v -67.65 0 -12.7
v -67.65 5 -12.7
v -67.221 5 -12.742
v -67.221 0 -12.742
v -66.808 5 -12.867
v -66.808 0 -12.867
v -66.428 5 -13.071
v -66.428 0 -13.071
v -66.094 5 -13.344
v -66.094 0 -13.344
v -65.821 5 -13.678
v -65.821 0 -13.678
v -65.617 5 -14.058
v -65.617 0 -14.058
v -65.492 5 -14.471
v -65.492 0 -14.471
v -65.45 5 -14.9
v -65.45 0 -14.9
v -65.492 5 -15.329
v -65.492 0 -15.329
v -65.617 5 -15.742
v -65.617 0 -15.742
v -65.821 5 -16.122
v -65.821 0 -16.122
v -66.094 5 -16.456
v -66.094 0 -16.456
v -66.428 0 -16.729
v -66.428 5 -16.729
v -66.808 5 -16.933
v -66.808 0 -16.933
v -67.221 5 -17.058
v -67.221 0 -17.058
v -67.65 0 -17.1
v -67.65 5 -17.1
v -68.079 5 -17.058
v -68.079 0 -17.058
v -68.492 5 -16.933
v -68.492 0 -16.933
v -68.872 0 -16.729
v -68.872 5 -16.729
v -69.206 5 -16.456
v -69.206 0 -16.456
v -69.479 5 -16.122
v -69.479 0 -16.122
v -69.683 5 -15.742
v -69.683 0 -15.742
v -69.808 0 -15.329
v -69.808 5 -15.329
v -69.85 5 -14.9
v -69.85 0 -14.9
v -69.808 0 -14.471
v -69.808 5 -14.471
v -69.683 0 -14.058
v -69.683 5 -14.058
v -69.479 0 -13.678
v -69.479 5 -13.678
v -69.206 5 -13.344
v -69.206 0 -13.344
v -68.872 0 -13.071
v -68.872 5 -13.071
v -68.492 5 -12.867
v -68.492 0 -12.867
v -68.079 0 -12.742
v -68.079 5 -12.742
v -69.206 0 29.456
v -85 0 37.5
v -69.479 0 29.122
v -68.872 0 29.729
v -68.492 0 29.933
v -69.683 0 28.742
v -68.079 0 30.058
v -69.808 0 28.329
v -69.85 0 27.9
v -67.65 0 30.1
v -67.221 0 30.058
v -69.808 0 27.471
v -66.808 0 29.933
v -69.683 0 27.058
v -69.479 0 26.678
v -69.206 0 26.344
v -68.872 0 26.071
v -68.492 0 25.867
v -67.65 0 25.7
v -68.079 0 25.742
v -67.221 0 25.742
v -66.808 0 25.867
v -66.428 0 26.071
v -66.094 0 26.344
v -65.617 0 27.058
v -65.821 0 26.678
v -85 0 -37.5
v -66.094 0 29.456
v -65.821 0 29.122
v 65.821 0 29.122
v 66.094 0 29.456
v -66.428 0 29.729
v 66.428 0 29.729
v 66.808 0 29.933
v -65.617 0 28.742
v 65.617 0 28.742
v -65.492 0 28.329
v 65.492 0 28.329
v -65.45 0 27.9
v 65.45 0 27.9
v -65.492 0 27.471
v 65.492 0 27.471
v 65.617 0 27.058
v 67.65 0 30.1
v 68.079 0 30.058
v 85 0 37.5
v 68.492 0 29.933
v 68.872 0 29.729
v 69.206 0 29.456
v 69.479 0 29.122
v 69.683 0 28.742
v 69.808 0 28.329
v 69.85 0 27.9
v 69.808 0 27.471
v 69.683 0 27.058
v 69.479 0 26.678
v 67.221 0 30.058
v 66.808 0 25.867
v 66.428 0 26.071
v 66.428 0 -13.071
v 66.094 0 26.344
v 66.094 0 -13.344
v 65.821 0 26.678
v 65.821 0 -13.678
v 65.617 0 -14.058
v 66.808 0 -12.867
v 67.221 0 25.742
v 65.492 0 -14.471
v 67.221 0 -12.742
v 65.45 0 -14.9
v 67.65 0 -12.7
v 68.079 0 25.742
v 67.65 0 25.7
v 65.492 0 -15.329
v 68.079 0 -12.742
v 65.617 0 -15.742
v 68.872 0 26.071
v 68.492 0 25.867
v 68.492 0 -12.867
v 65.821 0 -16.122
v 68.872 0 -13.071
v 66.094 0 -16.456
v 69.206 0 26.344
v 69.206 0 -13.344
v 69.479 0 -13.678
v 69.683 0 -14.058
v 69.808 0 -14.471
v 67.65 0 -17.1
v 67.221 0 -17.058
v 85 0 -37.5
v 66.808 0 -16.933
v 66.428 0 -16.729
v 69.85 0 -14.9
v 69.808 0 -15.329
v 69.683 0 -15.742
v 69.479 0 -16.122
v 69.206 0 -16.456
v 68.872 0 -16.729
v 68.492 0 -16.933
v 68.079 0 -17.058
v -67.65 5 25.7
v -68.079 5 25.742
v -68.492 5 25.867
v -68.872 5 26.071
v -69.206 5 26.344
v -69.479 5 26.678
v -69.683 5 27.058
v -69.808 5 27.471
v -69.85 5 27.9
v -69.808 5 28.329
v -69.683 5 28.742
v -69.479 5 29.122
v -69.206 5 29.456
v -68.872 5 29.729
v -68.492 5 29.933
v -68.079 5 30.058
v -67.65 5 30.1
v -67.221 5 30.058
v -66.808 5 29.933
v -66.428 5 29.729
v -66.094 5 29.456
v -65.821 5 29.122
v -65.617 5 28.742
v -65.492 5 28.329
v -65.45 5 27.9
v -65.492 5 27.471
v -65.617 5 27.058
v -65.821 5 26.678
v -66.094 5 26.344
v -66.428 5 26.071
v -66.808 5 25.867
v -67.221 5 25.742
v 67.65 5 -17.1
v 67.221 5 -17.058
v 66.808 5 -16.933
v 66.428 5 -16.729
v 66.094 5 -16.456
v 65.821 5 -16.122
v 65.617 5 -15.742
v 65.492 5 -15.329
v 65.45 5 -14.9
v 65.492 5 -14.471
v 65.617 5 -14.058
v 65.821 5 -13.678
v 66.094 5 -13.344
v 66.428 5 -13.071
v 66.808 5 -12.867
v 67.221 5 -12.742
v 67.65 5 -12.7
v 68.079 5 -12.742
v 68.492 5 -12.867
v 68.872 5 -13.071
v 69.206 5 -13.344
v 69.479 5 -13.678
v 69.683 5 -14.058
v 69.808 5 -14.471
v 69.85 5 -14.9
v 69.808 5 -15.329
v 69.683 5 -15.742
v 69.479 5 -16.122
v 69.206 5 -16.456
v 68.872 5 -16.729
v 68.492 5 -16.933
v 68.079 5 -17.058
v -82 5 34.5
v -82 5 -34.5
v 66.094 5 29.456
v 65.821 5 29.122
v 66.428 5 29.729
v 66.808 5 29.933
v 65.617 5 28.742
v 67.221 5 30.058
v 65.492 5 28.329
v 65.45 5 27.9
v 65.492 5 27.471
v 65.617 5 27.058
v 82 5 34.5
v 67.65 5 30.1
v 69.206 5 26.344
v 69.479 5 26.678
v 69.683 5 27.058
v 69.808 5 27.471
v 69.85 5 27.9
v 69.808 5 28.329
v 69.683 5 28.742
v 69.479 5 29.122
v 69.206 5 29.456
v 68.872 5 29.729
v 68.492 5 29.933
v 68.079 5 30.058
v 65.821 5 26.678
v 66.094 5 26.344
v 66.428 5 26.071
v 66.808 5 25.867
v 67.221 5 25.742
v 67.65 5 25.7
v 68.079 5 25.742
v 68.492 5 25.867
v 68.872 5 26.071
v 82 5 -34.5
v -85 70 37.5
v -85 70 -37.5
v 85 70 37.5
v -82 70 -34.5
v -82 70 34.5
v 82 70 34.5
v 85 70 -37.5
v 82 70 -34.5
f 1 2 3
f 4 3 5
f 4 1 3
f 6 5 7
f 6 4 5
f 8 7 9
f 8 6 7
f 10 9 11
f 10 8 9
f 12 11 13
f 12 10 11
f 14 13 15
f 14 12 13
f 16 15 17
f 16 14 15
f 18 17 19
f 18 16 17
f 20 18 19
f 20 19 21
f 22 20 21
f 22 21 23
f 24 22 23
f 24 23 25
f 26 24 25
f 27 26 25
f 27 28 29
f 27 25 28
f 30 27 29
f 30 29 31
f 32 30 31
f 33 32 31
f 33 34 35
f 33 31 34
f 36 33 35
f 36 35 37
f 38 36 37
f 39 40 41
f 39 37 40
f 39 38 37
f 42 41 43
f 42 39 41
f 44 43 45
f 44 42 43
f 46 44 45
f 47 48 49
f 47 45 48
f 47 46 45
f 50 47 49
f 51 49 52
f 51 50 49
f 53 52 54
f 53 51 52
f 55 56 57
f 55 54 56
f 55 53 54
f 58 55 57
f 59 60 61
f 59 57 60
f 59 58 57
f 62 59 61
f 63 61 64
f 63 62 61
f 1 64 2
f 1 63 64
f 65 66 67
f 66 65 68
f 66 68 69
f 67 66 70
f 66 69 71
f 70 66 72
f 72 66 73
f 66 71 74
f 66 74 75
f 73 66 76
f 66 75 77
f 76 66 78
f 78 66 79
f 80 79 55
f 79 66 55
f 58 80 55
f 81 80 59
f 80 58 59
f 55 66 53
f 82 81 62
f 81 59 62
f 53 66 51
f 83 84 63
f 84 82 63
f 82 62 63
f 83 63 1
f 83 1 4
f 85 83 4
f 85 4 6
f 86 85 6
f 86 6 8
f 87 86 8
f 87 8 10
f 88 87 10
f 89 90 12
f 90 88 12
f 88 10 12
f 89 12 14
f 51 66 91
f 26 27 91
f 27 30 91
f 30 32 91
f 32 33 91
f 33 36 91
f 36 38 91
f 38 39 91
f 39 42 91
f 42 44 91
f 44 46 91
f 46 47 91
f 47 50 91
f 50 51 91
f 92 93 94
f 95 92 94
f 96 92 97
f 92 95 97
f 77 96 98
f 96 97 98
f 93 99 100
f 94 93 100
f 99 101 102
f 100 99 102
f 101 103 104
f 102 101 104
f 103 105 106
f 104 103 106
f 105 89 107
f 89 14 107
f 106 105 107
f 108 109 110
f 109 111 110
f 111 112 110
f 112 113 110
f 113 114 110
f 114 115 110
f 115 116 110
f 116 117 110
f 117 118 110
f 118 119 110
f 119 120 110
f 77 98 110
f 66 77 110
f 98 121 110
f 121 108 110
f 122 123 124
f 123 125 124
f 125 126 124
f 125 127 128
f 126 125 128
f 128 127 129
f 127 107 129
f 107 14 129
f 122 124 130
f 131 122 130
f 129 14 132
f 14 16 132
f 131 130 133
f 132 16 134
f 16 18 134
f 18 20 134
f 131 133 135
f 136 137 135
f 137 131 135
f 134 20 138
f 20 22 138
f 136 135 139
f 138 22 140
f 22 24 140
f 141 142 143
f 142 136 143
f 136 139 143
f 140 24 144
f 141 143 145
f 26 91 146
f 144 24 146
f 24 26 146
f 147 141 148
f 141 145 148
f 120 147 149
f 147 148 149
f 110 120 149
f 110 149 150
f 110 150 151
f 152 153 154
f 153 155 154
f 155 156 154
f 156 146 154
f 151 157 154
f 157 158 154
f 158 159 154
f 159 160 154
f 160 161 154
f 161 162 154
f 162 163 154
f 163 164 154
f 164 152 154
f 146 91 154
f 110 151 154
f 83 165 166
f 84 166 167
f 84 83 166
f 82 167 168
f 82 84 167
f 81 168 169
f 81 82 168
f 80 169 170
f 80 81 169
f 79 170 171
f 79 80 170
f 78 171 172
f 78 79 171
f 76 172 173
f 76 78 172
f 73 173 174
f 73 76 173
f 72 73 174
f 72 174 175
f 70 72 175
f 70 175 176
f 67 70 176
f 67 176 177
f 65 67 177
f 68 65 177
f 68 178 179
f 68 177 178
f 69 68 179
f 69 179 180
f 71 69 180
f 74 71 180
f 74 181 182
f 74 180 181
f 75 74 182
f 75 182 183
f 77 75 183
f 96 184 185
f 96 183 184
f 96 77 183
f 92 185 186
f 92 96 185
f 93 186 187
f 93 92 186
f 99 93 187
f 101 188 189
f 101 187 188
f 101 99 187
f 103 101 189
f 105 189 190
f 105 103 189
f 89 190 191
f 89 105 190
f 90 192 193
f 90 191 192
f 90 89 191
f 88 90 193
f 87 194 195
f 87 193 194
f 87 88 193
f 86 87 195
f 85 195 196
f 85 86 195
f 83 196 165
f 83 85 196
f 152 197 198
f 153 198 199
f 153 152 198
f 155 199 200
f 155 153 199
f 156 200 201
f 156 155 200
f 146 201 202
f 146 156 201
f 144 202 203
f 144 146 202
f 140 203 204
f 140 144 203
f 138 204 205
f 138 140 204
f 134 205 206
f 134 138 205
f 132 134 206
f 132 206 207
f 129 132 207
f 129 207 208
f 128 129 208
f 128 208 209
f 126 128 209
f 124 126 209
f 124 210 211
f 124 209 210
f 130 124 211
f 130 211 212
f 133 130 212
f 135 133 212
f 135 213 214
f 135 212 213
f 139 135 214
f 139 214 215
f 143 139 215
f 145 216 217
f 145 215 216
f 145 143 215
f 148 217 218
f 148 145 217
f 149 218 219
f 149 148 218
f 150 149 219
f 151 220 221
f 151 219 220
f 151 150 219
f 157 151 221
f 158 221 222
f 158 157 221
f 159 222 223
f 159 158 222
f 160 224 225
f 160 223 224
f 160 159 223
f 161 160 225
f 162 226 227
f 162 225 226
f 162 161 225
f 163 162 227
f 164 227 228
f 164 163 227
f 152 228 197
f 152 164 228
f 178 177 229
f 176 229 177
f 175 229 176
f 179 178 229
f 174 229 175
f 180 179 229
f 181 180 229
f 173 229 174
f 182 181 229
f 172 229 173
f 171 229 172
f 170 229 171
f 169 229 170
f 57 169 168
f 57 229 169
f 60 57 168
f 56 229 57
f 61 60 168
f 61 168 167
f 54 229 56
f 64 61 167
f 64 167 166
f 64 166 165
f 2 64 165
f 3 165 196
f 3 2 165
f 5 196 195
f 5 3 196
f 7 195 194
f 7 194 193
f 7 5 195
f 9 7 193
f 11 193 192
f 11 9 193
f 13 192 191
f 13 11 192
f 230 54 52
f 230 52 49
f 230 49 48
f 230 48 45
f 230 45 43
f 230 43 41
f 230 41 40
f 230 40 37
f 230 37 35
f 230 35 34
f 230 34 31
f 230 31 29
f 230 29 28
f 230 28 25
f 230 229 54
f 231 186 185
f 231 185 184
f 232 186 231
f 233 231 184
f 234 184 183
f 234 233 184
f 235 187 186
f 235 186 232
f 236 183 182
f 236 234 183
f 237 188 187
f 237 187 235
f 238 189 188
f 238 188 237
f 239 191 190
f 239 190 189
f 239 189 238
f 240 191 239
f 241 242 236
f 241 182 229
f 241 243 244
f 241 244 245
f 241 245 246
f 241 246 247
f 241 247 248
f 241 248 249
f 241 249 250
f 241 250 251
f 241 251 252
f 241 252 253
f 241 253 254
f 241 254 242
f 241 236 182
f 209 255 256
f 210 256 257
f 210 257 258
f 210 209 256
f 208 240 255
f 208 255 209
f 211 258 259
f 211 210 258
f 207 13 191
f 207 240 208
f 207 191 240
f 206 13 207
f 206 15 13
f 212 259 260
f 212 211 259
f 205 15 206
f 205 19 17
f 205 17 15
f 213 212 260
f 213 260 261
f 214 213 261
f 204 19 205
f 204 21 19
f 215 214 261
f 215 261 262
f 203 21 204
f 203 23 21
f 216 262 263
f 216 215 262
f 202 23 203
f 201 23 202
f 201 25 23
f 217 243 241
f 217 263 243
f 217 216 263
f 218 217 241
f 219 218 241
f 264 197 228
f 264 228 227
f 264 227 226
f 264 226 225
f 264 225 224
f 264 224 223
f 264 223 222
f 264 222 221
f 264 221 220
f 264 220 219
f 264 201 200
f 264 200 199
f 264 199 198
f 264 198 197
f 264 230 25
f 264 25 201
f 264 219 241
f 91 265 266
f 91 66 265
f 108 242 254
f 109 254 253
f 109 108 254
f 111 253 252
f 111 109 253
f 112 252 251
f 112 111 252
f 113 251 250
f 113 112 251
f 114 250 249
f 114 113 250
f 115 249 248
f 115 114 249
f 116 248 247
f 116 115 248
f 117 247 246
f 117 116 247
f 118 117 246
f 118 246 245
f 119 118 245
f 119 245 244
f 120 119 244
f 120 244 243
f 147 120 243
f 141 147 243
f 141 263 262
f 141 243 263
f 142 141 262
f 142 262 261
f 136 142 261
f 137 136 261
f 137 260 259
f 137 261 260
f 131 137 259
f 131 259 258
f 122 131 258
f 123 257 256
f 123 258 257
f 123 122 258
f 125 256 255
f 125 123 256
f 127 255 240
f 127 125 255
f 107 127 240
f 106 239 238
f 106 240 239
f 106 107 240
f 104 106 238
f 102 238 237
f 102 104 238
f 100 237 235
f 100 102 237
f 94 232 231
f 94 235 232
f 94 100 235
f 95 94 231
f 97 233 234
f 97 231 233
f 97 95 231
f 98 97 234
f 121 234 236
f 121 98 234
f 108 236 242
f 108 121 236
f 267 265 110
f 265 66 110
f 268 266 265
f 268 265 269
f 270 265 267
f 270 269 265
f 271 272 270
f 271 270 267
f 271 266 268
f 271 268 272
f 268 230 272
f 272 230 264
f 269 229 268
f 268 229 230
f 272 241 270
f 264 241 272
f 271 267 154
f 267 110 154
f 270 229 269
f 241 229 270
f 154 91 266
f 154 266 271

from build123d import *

# Parameters (mm, degrees)
SKETCH2_W           = 170
SKETCH2_H           = 75
BOSS_EXTRUDE2_DEPTH = 5
EXTRUDE_THIN1_START = 5
SKETCH2_3_W         = 170
SKETCH2_3_H         = 75
SKETCH2_3_W_2       = 164
SKETCH2_3_H_2       = 69
EXTRUDE_THIN1_DEPTH = 65
SKETCH2_6_R         = 2.2
CUT_EXTRUDE1_DEPTH  = 6


with BuildPart() as part:
    # Sketch2 → Boss-Extrude2 (new body)
    with BuildSketch(Plane(origin=(0, 0, 0), x_dir=(1, 0, 0), z_dir=(0, 1, 0))):
        Rectangle(SKETCH2_W, SKETCH2_H)
    extrude(amount=BOSS_EXTRUDE2_DEPTH)

    # Sketch2<3> → Extrude-Thin1 (add)
    with BuildSketch(Plane(origin=(0, 0, 0), x_dir=(1, 0, 0), z_dir=(0, 1, 0)).offset(EXTRUDE_THIN1_START)):
        Rectangle(SKETCH2_3_W, SKETCH2_3_H)
        Rectangle(SKETCH2_3_W_2, SKETCH2_3_H_2, mode=Mode.SUBTRACT)
    extrude(amount=EXTRUDE_THIN1_DEPTH)

    # Sketch2<6> → Cut-Extrude1 (cut)
    with BuildSketch(Plane(origin=(0, 0, 0), x_dir=(1, 0, 0), z_dir=(0, 1, 0))):
        with Locations(Location((-67.65, 14.9, 0), (0, 0, 270))):
            Circle(SKETCH2_6_R)
        with Locations(Location((67.65, 14.9, 0), (0, 0, 90))):
            Circle(SKETCH2_6_R)
        with Locations(Location((67.65, -27.9, 0), (0, 0, 270))):
            Circle(SKETCH2_6_R)
        with Locations(Location((-67.65, -27.9, 0), (0, 0, 90))):
            Circle(SKETCH2_6_R)
    extrude(amount=CUT_EXTRUDE1_DEPTH, mode=Mode.SUBTRACT)


solid = part.part
